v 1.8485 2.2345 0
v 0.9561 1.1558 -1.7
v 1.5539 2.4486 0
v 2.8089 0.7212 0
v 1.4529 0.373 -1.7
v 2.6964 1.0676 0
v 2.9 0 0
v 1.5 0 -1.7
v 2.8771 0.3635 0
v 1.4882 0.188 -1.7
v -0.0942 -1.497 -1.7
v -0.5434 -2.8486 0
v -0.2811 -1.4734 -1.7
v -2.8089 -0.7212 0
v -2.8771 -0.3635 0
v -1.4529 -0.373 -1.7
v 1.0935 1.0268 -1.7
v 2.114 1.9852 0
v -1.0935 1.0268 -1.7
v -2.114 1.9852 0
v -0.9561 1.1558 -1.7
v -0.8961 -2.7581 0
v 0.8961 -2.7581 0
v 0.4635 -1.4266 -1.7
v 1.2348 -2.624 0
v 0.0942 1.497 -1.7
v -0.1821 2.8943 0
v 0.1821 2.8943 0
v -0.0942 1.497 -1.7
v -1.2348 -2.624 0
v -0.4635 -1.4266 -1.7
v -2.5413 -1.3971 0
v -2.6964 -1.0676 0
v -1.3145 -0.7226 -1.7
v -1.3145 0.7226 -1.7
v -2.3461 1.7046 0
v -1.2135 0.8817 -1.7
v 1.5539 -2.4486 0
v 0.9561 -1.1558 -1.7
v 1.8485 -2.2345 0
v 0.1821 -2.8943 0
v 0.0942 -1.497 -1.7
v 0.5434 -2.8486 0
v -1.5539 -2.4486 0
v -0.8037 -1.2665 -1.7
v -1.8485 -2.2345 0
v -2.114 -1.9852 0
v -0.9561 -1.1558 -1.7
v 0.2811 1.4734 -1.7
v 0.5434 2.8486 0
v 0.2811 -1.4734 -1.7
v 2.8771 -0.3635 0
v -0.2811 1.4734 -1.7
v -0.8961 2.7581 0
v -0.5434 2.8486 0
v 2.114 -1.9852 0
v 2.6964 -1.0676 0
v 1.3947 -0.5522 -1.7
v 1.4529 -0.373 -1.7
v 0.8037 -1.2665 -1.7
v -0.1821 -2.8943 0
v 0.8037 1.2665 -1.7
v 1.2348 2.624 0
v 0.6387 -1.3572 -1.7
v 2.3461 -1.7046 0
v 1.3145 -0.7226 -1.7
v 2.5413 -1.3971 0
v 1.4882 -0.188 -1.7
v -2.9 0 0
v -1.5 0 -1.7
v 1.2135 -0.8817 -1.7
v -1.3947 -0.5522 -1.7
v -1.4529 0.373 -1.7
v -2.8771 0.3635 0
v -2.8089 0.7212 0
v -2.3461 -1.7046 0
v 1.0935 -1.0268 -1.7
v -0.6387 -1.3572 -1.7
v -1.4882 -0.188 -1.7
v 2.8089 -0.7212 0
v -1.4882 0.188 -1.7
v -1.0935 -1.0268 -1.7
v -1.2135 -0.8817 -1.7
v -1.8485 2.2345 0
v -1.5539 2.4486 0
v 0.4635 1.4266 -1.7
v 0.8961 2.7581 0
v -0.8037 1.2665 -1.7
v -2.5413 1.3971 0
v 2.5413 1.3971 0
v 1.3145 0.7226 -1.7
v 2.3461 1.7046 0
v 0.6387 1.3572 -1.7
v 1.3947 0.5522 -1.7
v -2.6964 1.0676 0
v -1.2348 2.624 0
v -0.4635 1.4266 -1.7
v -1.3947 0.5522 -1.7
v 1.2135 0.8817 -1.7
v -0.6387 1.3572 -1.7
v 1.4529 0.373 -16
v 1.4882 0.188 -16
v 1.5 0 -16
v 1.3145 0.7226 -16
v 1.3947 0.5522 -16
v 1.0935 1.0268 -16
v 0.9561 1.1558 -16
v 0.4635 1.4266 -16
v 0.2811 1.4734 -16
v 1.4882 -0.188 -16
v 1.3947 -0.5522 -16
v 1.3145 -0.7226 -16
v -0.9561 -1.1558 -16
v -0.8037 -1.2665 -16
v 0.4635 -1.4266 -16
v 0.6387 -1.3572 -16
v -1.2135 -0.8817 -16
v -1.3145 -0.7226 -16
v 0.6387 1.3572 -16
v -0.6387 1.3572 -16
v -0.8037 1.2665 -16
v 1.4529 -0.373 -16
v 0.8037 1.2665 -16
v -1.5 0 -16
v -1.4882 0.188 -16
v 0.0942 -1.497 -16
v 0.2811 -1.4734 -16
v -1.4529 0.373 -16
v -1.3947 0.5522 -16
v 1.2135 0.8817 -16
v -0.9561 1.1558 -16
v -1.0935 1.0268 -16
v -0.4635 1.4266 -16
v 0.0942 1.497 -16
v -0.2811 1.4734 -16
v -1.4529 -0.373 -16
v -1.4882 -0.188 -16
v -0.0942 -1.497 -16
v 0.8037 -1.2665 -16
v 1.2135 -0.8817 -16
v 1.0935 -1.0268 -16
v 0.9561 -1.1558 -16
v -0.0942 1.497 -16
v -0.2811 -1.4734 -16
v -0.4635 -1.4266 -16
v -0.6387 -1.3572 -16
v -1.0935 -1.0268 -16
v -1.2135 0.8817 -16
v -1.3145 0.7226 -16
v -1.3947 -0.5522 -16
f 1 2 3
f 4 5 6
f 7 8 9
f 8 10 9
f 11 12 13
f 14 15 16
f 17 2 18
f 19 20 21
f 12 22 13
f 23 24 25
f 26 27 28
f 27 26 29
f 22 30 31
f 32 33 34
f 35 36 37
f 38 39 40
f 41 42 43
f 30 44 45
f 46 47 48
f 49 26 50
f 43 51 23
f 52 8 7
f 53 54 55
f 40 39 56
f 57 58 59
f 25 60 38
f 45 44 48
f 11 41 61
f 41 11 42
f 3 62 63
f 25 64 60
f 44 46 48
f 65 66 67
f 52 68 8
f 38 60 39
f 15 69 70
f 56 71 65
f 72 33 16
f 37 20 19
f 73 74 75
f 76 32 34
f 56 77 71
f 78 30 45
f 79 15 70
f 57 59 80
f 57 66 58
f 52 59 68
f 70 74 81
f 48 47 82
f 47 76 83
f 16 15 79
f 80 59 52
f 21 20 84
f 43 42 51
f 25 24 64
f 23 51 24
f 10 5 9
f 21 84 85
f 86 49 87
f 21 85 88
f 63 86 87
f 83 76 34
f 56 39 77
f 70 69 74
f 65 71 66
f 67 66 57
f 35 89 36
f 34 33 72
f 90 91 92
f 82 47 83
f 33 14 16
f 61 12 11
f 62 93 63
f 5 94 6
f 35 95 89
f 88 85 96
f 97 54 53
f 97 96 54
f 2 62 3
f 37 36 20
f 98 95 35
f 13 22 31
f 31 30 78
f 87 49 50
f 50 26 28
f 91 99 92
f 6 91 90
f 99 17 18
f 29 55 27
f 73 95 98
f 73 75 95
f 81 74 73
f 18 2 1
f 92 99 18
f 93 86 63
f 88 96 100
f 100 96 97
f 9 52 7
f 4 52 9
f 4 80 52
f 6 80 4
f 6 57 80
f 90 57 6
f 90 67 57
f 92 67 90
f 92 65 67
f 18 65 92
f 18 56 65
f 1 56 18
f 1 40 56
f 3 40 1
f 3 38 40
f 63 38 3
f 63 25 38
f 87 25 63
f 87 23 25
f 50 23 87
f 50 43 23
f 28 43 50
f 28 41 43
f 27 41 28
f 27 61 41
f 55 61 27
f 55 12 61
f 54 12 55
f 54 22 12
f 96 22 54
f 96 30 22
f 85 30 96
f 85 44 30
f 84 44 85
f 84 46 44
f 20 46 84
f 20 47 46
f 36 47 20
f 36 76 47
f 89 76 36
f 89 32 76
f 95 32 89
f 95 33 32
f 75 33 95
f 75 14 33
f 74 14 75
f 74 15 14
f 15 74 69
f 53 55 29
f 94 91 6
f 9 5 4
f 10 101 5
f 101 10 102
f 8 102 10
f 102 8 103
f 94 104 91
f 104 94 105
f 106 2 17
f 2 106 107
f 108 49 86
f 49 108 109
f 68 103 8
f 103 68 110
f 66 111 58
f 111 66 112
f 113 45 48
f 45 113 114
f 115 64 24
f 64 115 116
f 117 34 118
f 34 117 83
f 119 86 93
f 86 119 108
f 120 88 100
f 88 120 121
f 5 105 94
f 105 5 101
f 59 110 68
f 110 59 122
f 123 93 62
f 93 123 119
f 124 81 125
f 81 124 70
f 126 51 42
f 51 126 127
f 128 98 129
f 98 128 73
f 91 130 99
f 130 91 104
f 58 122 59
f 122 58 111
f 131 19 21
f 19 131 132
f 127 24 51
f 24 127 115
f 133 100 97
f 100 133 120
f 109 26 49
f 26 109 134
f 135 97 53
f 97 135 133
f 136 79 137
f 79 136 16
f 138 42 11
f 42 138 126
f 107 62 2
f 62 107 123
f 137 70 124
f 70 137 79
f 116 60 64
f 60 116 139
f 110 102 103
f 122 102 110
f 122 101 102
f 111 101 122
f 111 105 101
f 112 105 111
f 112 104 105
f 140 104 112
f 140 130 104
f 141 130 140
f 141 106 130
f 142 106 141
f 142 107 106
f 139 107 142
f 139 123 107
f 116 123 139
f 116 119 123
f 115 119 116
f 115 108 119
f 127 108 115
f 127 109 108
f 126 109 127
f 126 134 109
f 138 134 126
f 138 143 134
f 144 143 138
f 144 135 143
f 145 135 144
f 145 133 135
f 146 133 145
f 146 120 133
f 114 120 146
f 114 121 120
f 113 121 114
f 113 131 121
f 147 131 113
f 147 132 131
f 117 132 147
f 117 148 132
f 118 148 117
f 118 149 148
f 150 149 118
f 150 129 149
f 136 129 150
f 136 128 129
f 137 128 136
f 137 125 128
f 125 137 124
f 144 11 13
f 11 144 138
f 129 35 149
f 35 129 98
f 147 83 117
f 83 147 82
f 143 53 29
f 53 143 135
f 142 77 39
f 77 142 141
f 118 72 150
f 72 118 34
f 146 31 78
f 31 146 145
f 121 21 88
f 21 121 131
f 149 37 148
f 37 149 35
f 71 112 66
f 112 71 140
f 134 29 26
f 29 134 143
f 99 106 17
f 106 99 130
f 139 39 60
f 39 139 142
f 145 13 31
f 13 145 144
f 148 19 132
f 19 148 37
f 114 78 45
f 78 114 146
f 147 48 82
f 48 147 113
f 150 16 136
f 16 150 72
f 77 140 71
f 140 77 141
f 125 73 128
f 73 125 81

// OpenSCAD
$fn = 50;


difference() {
	union() {
		translate(v = [0, 0, -1.7000000000]) {
			rotate(a = [0, 0, 0]) {
				cylinder(h = 1.7000000000, r1 = 1.5000000000, r2 = 2.9000000000);
			}
		}
		translate(v = [0, 0, -16]) {
			rotate(a = [0, 0, 0]) {
				cylinder(h = 16, r = 1.5000000000);
			}
		}
	}
	union();
}
